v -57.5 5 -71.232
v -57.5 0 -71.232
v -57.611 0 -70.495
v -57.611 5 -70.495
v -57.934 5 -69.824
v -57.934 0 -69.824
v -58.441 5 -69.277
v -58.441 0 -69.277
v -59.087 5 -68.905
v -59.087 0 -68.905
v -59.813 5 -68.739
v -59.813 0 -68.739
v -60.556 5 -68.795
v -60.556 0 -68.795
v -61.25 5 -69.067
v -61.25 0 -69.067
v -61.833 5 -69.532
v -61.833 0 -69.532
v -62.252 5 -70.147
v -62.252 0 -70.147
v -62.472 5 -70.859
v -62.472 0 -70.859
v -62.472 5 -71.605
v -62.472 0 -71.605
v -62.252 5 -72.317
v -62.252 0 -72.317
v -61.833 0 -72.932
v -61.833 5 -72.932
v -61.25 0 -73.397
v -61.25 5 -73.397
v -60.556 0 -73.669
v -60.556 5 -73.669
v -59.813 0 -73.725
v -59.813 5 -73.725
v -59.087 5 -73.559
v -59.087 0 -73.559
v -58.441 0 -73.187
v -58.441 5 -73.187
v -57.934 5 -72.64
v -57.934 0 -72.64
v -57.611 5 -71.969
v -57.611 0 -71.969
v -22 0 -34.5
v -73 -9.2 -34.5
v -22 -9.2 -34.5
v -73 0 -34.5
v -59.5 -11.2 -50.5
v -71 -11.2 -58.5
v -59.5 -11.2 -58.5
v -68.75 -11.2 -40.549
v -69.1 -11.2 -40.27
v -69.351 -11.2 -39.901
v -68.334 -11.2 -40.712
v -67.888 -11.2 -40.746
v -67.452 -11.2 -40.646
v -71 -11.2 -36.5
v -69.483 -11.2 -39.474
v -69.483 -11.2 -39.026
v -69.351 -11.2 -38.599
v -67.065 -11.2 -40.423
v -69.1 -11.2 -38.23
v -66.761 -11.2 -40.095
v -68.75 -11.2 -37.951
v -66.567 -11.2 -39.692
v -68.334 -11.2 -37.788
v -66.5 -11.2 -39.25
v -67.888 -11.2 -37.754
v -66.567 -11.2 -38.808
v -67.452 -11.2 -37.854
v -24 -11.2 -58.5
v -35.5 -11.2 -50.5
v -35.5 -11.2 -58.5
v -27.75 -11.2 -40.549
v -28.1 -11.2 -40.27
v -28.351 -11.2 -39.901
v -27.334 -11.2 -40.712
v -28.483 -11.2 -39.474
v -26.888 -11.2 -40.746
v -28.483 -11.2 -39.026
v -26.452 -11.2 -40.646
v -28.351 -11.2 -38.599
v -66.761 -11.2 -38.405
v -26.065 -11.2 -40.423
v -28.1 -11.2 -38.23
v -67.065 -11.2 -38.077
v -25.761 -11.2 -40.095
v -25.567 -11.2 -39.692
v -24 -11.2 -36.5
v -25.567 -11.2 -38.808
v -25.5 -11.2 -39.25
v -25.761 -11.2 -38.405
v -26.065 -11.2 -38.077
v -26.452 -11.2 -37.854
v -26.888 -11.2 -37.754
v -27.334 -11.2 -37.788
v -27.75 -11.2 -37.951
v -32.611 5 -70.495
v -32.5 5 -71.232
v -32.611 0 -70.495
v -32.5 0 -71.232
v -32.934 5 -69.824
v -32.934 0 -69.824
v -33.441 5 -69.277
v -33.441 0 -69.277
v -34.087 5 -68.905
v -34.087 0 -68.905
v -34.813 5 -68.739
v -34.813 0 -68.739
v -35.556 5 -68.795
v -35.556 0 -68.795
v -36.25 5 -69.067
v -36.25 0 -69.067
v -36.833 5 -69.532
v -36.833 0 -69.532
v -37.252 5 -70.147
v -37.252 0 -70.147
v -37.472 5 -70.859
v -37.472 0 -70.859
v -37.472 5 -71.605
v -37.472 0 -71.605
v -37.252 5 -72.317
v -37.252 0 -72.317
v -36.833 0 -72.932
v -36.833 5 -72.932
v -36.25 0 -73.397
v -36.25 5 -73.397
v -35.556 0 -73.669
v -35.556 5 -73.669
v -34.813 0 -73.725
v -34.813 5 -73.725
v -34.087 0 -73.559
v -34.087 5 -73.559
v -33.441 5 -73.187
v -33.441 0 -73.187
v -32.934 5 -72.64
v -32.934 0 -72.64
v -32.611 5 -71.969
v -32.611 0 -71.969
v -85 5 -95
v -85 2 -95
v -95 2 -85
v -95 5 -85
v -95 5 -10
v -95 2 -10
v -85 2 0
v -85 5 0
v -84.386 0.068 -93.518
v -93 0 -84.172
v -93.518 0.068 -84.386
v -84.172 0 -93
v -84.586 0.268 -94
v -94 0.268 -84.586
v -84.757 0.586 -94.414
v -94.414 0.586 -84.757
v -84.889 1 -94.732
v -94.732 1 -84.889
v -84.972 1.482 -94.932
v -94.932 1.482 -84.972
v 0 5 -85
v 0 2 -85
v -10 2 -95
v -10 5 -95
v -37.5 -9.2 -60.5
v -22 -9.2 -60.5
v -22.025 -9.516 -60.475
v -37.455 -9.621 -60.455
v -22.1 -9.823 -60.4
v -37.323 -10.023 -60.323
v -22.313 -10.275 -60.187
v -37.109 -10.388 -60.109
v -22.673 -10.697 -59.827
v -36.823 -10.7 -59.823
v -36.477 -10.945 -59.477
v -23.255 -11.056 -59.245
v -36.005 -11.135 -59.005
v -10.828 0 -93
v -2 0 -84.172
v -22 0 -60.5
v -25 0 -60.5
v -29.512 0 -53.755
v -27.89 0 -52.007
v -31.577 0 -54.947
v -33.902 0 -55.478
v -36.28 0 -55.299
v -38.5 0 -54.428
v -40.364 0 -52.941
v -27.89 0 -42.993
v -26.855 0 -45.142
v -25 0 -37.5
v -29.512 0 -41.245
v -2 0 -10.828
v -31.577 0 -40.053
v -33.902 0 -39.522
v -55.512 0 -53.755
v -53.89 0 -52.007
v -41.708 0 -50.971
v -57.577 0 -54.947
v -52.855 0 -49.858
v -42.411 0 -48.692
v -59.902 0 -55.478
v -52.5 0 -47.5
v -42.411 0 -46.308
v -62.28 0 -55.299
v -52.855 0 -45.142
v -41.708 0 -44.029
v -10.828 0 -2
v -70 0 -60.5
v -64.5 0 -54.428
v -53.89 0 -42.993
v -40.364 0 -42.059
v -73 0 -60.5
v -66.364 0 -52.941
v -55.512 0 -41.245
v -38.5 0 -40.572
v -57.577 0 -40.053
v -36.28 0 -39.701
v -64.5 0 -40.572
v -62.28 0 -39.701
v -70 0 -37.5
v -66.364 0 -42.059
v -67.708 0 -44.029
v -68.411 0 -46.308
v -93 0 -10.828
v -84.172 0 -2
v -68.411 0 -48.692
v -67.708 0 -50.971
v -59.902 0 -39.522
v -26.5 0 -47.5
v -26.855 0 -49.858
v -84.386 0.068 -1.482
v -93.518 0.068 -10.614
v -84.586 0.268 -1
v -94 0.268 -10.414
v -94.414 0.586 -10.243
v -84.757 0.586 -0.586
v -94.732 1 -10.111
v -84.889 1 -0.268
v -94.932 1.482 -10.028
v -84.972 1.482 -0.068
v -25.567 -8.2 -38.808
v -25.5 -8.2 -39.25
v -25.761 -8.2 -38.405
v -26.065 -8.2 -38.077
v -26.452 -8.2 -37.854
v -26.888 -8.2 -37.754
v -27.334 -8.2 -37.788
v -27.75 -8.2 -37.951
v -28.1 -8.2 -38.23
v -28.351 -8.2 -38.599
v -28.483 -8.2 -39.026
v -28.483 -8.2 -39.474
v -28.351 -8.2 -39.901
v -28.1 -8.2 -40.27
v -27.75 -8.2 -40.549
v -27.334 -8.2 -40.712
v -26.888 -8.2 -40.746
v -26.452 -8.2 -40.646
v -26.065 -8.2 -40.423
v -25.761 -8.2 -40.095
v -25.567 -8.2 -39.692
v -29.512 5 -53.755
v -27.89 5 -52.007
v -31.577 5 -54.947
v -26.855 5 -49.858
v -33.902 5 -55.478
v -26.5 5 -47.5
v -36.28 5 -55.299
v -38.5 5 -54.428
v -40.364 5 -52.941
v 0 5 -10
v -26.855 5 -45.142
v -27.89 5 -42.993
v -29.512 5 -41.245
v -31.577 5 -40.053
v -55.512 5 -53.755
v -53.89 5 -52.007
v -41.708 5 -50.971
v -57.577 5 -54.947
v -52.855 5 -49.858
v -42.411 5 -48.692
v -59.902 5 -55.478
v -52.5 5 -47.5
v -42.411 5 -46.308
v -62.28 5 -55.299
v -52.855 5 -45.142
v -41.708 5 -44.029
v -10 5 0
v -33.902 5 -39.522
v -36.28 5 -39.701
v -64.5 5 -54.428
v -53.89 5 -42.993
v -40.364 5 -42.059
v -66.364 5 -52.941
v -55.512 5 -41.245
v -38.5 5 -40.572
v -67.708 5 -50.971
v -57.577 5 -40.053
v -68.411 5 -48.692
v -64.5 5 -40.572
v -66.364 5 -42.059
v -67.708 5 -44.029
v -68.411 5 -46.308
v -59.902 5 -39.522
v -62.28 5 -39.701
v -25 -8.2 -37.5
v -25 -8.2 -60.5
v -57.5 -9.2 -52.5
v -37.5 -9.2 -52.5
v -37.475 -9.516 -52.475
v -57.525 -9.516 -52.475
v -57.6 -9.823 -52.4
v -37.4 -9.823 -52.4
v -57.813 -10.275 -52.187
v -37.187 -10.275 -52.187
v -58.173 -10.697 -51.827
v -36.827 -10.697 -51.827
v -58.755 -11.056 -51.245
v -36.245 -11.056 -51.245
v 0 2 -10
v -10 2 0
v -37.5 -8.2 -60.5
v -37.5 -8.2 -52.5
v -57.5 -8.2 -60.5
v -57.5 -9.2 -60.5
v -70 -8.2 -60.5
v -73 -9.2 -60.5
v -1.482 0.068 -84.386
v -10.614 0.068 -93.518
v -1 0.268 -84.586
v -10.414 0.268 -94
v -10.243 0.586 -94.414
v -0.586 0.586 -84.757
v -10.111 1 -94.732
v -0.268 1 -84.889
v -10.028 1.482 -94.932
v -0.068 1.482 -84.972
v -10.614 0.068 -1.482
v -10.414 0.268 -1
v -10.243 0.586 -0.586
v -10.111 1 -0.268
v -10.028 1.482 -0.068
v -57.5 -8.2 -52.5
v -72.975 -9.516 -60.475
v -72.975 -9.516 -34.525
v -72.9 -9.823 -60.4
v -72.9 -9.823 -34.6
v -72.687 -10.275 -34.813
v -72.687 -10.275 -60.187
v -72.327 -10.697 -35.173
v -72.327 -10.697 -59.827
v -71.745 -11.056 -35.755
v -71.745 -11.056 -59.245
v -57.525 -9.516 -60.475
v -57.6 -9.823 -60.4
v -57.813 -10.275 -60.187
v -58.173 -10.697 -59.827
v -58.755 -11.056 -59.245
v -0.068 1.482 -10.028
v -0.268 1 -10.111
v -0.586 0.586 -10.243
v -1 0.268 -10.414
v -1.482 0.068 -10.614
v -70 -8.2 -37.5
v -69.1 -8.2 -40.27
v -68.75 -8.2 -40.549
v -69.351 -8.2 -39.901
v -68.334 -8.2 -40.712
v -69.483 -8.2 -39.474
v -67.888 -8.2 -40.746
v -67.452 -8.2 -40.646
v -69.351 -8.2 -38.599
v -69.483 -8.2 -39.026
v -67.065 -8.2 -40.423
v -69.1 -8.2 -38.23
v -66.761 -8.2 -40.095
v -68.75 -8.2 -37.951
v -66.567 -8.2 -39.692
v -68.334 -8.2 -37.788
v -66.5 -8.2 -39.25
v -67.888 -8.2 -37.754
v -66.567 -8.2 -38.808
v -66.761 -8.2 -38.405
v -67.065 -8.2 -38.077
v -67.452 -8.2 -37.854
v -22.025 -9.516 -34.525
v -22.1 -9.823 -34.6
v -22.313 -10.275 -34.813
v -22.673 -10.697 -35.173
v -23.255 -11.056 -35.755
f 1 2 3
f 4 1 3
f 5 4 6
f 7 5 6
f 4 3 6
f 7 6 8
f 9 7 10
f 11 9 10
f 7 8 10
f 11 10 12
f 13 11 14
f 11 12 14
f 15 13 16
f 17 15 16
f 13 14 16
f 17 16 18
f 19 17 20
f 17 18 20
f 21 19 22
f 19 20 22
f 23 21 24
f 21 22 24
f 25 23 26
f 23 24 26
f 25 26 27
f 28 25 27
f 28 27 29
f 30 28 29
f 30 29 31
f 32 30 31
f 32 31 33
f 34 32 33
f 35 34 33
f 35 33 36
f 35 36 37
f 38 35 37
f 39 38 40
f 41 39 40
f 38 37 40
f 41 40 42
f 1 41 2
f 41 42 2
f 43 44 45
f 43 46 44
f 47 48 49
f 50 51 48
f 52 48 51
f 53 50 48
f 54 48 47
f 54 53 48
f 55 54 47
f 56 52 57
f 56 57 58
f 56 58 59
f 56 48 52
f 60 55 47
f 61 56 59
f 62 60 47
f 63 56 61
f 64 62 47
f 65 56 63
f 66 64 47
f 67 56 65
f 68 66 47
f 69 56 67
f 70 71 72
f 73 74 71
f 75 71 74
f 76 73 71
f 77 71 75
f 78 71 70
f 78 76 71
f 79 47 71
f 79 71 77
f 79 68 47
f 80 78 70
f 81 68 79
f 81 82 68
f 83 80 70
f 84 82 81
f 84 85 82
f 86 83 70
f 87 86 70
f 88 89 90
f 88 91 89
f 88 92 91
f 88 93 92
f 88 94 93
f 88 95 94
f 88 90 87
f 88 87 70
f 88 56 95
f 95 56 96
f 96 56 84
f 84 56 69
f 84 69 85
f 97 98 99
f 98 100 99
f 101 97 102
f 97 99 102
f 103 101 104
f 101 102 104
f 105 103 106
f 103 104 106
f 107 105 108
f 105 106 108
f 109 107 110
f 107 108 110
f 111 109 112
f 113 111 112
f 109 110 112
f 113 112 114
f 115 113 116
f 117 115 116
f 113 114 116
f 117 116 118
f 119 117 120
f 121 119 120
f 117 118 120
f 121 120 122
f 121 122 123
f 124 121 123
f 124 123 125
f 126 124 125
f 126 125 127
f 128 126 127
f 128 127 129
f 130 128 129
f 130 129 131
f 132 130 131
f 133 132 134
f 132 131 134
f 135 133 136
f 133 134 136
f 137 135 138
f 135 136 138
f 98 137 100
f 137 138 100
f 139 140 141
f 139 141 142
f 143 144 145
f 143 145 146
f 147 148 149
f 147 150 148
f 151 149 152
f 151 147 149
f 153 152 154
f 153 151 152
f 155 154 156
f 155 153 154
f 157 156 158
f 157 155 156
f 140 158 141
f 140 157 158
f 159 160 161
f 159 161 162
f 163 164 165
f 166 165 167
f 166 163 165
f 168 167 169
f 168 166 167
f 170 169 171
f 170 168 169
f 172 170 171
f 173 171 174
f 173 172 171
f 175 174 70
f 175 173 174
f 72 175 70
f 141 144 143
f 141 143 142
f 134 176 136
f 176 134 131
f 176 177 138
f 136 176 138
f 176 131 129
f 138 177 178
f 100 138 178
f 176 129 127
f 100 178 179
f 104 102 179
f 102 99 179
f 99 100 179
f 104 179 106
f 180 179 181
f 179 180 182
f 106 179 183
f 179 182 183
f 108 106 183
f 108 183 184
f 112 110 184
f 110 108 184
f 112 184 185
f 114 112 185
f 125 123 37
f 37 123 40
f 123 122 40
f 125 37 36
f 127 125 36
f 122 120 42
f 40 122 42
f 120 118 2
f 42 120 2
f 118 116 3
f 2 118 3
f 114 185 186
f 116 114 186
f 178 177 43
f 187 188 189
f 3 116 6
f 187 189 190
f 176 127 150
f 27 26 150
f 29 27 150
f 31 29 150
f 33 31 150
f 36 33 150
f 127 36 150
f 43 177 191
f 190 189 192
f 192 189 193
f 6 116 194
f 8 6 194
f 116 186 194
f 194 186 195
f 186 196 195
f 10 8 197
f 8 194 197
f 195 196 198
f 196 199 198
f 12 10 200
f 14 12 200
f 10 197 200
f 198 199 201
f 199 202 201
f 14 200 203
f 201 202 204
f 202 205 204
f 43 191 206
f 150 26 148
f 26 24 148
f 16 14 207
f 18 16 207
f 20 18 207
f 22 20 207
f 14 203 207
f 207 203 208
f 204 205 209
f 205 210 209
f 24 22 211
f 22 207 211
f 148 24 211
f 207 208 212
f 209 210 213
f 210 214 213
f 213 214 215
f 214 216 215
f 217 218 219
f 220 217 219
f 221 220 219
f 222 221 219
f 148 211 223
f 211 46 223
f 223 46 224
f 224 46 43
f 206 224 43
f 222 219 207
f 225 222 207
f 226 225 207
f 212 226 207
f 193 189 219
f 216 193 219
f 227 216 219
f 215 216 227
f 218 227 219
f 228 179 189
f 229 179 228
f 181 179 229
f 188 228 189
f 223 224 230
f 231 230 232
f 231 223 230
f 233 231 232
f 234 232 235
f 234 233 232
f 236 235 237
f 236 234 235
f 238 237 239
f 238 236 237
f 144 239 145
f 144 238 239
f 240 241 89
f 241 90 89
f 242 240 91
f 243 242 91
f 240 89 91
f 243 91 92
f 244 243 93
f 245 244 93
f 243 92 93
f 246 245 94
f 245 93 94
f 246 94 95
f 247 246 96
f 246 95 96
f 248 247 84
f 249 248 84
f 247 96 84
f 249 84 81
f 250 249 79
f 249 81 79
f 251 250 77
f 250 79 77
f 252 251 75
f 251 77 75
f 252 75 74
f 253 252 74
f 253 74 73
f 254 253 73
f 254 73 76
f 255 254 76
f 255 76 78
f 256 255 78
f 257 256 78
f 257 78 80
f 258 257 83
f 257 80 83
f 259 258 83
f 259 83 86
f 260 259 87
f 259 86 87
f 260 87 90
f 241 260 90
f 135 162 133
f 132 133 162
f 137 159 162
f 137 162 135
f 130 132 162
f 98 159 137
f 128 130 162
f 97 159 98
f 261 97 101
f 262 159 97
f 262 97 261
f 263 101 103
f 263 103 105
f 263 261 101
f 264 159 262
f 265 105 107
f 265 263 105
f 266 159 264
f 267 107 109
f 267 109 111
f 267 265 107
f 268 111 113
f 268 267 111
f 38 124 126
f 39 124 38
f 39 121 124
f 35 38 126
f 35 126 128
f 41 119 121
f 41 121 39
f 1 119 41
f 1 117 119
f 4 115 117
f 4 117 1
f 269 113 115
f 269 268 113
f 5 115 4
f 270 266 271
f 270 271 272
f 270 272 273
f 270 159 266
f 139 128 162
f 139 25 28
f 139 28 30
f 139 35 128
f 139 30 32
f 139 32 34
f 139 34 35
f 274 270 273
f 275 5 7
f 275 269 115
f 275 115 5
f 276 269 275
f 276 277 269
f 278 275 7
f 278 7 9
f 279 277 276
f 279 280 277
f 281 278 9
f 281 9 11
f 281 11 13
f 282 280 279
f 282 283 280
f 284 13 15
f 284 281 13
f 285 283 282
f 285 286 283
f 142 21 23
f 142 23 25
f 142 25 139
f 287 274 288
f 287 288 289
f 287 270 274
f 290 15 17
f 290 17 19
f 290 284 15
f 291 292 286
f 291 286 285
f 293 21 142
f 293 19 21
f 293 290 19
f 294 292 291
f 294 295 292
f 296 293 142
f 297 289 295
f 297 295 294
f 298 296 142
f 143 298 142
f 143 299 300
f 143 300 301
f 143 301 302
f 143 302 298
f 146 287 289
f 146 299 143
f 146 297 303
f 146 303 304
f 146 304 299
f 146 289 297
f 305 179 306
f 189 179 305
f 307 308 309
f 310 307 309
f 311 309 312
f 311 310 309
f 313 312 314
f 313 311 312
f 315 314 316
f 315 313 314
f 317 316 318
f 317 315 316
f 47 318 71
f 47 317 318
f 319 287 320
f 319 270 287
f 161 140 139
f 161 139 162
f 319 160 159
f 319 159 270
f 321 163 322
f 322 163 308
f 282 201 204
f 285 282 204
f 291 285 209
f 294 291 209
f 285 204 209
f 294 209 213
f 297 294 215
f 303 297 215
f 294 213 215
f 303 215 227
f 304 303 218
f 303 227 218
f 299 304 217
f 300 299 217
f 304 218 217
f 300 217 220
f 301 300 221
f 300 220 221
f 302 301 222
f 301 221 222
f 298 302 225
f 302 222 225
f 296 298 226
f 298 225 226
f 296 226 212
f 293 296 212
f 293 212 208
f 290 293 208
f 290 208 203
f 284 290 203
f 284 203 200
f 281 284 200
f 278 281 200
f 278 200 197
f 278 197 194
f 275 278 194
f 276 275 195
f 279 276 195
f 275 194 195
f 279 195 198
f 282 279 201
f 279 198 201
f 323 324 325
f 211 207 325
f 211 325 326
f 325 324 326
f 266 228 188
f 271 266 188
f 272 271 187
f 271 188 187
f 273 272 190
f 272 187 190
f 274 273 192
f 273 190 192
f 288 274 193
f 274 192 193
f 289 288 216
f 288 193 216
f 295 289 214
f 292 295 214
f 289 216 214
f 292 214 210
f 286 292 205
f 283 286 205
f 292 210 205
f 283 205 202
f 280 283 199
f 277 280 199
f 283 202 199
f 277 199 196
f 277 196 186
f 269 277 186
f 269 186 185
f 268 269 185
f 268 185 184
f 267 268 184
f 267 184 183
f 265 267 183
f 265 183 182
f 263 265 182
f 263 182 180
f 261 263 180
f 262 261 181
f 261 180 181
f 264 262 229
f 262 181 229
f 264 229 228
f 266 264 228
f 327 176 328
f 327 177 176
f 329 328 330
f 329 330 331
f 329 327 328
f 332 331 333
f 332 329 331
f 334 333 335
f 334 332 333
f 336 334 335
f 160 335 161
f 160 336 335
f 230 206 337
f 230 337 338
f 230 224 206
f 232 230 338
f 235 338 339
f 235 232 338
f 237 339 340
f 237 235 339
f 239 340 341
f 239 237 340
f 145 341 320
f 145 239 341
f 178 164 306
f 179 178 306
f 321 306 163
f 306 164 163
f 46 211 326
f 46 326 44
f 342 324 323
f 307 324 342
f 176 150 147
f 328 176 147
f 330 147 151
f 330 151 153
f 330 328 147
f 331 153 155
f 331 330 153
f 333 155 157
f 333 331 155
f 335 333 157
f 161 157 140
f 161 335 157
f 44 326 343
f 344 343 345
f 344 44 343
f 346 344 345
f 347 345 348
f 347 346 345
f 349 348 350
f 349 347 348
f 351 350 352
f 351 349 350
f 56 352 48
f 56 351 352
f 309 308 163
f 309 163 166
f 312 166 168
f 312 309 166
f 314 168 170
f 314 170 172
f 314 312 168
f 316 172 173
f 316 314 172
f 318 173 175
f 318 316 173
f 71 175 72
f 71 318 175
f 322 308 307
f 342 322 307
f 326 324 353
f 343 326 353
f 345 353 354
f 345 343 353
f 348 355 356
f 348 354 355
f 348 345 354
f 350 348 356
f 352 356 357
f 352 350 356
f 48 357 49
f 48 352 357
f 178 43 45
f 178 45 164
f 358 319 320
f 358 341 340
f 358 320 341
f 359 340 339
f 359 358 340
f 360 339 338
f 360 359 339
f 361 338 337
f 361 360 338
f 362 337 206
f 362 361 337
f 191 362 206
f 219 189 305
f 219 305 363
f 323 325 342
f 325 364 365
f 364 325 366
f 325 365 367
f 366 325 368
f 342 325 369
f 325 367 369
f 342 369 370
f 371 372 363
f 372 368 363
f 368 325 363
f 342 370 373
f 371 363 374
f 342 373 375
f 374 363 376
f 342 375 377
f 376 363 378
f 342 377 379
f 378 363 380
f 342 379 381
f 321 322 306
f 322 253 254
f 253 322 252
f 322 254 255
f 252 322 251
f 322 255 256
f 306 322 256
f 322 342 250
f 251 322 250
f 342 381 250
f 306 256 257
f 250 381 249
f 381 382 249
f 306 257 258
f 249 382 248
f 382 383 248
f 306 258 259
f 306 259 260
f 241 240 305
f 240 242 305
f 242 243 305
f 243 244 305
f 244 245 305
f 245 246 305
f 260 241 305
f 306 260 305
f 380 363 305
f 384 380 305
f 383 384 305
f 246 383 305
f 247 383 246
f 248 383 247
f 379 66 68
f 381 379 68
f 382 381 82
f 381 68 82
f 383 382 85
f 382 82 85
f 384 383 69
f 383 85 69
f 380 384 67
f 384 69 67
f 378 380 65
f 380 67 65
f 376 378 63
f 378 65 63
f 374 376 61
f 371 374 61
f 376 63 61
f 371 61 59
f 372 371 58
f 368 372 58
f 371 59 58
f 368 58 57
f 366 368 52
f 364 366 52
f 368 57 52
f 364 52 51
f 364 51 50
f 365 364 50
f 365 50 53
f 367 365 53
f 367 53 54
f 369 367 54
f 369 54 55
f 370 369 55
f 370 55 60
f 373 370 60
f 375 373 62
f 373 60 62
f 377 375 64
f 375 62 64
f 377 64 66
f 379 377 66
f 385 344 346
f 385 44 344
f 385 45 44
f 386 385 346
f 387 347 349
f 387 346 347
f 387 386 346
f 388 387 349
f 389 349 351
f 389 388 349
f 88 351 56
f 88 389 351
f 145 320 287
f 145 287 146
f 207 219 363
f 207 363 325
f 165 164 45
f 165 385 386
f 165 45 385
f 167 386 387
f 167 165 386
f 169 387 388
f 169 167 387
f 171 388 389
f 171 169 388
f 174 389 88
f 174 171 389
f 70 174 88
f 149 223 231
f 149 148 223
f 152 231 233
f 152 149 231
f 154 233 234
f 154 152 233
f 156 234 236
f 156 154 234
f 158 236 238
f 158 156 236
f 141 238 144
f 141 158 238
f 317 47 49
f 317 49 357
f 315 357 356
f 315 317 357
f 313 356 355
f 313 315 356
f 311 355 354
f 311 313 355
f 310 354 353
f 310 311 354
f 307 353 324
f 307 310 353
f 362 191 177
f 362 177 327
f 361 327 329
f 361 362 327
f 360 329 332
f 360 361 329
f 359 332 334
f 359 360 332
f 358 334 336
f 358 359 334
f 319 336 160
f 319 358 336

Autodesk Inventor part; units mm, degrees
ref_plane "YZ Plane" through (0, 0, 0) normal (1, 0, 0) x (0, 1, 0)
ref_plane "XZ Plane" through (0, 0, 0) normal (0, 1, 0) x (-1, 0, 0)
ref_plane "XY Plane" through (0, 0, 0) normal (0, 0, 1) x (1, 0, 0)
sketch "Sketch1" plane through (0, 0, 0) normal (0, 1, 0) x (-1, 0, 0)
  line L0 (0, 0) -> (95, 0)
  line L1 (95, 0) -> (95, -95)
  line L2 (95, -95) -> (0, -95)
  line L3 (0, -95) -> (0, 0)
  dimension "d0" = 95
  dimension "d1" = 95
extrude "Extrusion1" add sketch "Sketch1" along normal blind 5
chamfer "Chamfer1" distance 10 angle 45 4 edges at (0, 2.5, -95) (0, 2.5, 0) (-95, 2.5, 0) (-95, 2.5, -95)
sketch "Sketch2" plane through (0, 0, 0) normal (0, -1, 0) x (1, 0, 0)
  line L0 (-85, -95) -> (-95, -85) projected
  line L1 (-10, -95) -> (-85, -95) projected
  line L2 (0, -85) -> (-10, -95) projected
  line L3 (0, -10) -> (0, -85) projected
  line L4 (-10, 0) -> (0, -10) projected
  line L5 (-85, 0) -> (-10, 0) projected
  line L6 (-95, -10) -> (-85, 0) projected
  line L7 (-95, -85) -> (-95, -10) projected
  line L8 (-47.5, -95) -> (-47.5, -71.232)
  line L9 (-47.5, -71.232) -> (-35, -71.232)
  circle A0 centre (-35, -71.232) radius 2.5
  circle A1 centre (-60, -71.232) radius 2.5
  point P0 (0, 0)
  dimension "d7" = 23.768
  dimension "d9" = 12.5
  dimension "d15" = 5
extrude "Extrusion2" cut sketch "Sketch2" against normal blind 5 contours A0 | A1
sketch "Sketch3" plane through (0, 0, 0) normal (0, -1, 0) x (1, 0, 0)
  circle A0 centre (-35, -71.232) radius 2.5 projected
  line L0 (-85, -95) -> (-95, -85) projected
  line L1 (-10, -95) -> (-85, -95) projected
  line L2 (0, -85) -> (-10, -95) projected
  line L3 (0, -10) -> (0, -85) projected
  line L4 (-10, 0) -> (0, -10) projected
  line L5 (-85, 0) -> (-10, 0) projected
  line L6 (-95, -10) -> (-85, 0) projected
  line L7 (-95, -85) -> (-95, -10) projected
  line L8 (-47.5, -95) -> (-47.5, -47.5)
  line L9 (-85, 0) -> (-10, 0) projected
  line L10 (-34.5, -47.5) -> (-60.5, -47.5)
  circle A1 centre (-34.5, -47.5) radius 8
  circle A2 centre (-60.5, -47.5) radius 8
  point P0 (0, 0)
  dimension "d17" = 47.5
  dimension "d18" = 26
  dimension "d19" = 16
extrude "Extrusion3" cut sketch "Sketch3" against normal blind 5 contours A1 | A2
sketch "Sketch4" plane through (0, 0, 0) normal (0, -1, 0) x (1, 0, 0)
  circle A0 centre (-60.5, -47.5) radius 8 projected
  circle A1 centre (-34.5, -47.5) radius 8 projected
  circle A2 centre (-35, -71.232) radius 2.5 projected
  line L0 (-85, -95) -> (-95, -85) projected
  line L1 (-10, -95) -> (-85, -95) projected
  line L2 (0, -85) -> (-10, -95) projected
  line L3 (0, -10) -> (0, -85) projected
  line L4 (-10, 0) -> (0, -10) projected
  line L5 (-85, 0) -> (-10, 0) projected
  line L6 (-95, -10) -> (-85, 0) projected
  line L7 (-95, -85) -> (-95, -10) projected
  line L8 (-47.5, -95) -> (-47.5, -47.5)
  line L9 (-85, 0) -> (-10, 0) projected
  line L10 (-70, -57.5) -> (-25, -57.5)
  line L11 (-25, -57.5) -> (-25, -37.5)
  line L12 (-25, -37.5) -> (-70, -37.5)
  line L13 (-70, -37.5) -> (-70, -57.5)
  line L14 (-70, -57.5) -> (-25, -37.5) construction
  line L15 (-25, -57.5) -> (-70, -37.5) construction
  line L16 (-22, -34.5) -> (-22, -60.5)
  line L17 (-22, -60.5) -> (-73, -60.5)
  line L18 (-73, -60.5) -> (-73, -34.5)
  line L19 (-73, -34.5) -> (-22, -34.5)
  line L20 (-25, -57.5) -> (-25, -60.5)
  line L21 (-70, -57.5) -> (-70, -60.5)
  point P0 (0, 0)
  point P1 (-70, -60.5)
  dimension "d22" = 47.5
  dimension "d23" = 45
  dimension "d24" = 20
  dimension "d25" = 3
extrude "Extrusion4" add sketch "Sketch4" along normal blind 11.2 contours L20 L11 L12 L13 L21 L17 L18 L19 L16
sketch "Sketch5" plane through (0, -11.2, 0) normal (0, -1, 0) x (1, 0, 0)
  line L0 (-70, -37.5) -> (-25, -37.5) projected
  line L1 (-25, -37.5) -> (-25, -60.5) projected
  line L2 (-25, -60.5) -> (-22, -60.5) projected
  line L3 (-22, -60.5) -> (-22, -34.5) projected
  line L4 (-22, -34.5) -> (-73, -34.5) projected
  line L5 (-73, -34.5) -> (-73, -60.5) projected
  line L6 (-73, -60.5) -> (-70, -60.5) projected
  line L7 (-70, -60.5) -> (-70, -37.5) projected
  line L8 (-25, -60.5) -> (-70, -60.5)
  point P0 (0, 0)
extrude "Extrusion5" add sketch "Sketch5" against normal blind 3 contours L0 L1 L8 L7
sketch "Sketch6" plane through (0, -11.2, 0) normal (0, -1, 0) x (1, 0, 0)
  line L0 (-25, -37.5) -> (-70, -37.5) projected
  line L1 (-70, -37.5) -> (-70, -60.5) projected
  line L2 (-25, -60.5) -> (-25, -37.5) projected
  line L3 (-70, -37.5) -> (-70, -39.25)
  line L4 (-70, -39.25) -> (-68, -39.25)
  circle A0 centre (-68, -39.25) radius 1.5
  line L5 (-47.5, -37.5) -> (-47.5, -39.5)
  circle A1 centre (-27, -39.25) radius 1.5
  line L6 (-73, -60.5) -> (-22, -60.5) projected
  line L7 (-47.5, -60.5) -> (-57.5, -60.5)
  line L8 (-57.5, -60.5) -> (-57.5, -52.5)
  line L9 (-57.5, -52.5) -> (-47.5, -52.5)
  line L10 (-47.5, -52.5) -> (-47.5, -60.5)
  line L11 (-37.5, -60.5) -> (-37.5, -52.5)
  line L12 (-37.5, -52.5) -> (-47.5, -52.5)
  point P0 (0, 0)
  dimension "d30" = 1.75
  dimension "d31" = 2
  dimension "d32" = 3
  dimension "d33" = 2
  dimension "d36" = 10
  dimension "d37" = 8
extrude "Extrusion6" cut sketch "Sketch6" against normal blind 3 contours L6 L10 L12 L11 | L6 L8 L9 L10 | A0 | A1
fillet "Fillet1" radius 2 16 edges at (-90, 0, -5) (-95, 0, -47.5) (-47.5, 0, 0) (-5, 0, -5) (0, 0, -47.5) (-90, 0, -90) (-47.5, 0, -95) (-5, 0, -90) (-22, -11.2, -47.5) (-47.5, -11.2, -34.5) (-73, -11.2, -47.5) (-65.25, -11.2, -60.5) (-29.75, -11.2, -60.5) (-47.5, -11.2, -52.5) (-57.5, -11.2, -56.5) (-37.5, -11.2, -56.5)
properties part number "TutupAtas"
